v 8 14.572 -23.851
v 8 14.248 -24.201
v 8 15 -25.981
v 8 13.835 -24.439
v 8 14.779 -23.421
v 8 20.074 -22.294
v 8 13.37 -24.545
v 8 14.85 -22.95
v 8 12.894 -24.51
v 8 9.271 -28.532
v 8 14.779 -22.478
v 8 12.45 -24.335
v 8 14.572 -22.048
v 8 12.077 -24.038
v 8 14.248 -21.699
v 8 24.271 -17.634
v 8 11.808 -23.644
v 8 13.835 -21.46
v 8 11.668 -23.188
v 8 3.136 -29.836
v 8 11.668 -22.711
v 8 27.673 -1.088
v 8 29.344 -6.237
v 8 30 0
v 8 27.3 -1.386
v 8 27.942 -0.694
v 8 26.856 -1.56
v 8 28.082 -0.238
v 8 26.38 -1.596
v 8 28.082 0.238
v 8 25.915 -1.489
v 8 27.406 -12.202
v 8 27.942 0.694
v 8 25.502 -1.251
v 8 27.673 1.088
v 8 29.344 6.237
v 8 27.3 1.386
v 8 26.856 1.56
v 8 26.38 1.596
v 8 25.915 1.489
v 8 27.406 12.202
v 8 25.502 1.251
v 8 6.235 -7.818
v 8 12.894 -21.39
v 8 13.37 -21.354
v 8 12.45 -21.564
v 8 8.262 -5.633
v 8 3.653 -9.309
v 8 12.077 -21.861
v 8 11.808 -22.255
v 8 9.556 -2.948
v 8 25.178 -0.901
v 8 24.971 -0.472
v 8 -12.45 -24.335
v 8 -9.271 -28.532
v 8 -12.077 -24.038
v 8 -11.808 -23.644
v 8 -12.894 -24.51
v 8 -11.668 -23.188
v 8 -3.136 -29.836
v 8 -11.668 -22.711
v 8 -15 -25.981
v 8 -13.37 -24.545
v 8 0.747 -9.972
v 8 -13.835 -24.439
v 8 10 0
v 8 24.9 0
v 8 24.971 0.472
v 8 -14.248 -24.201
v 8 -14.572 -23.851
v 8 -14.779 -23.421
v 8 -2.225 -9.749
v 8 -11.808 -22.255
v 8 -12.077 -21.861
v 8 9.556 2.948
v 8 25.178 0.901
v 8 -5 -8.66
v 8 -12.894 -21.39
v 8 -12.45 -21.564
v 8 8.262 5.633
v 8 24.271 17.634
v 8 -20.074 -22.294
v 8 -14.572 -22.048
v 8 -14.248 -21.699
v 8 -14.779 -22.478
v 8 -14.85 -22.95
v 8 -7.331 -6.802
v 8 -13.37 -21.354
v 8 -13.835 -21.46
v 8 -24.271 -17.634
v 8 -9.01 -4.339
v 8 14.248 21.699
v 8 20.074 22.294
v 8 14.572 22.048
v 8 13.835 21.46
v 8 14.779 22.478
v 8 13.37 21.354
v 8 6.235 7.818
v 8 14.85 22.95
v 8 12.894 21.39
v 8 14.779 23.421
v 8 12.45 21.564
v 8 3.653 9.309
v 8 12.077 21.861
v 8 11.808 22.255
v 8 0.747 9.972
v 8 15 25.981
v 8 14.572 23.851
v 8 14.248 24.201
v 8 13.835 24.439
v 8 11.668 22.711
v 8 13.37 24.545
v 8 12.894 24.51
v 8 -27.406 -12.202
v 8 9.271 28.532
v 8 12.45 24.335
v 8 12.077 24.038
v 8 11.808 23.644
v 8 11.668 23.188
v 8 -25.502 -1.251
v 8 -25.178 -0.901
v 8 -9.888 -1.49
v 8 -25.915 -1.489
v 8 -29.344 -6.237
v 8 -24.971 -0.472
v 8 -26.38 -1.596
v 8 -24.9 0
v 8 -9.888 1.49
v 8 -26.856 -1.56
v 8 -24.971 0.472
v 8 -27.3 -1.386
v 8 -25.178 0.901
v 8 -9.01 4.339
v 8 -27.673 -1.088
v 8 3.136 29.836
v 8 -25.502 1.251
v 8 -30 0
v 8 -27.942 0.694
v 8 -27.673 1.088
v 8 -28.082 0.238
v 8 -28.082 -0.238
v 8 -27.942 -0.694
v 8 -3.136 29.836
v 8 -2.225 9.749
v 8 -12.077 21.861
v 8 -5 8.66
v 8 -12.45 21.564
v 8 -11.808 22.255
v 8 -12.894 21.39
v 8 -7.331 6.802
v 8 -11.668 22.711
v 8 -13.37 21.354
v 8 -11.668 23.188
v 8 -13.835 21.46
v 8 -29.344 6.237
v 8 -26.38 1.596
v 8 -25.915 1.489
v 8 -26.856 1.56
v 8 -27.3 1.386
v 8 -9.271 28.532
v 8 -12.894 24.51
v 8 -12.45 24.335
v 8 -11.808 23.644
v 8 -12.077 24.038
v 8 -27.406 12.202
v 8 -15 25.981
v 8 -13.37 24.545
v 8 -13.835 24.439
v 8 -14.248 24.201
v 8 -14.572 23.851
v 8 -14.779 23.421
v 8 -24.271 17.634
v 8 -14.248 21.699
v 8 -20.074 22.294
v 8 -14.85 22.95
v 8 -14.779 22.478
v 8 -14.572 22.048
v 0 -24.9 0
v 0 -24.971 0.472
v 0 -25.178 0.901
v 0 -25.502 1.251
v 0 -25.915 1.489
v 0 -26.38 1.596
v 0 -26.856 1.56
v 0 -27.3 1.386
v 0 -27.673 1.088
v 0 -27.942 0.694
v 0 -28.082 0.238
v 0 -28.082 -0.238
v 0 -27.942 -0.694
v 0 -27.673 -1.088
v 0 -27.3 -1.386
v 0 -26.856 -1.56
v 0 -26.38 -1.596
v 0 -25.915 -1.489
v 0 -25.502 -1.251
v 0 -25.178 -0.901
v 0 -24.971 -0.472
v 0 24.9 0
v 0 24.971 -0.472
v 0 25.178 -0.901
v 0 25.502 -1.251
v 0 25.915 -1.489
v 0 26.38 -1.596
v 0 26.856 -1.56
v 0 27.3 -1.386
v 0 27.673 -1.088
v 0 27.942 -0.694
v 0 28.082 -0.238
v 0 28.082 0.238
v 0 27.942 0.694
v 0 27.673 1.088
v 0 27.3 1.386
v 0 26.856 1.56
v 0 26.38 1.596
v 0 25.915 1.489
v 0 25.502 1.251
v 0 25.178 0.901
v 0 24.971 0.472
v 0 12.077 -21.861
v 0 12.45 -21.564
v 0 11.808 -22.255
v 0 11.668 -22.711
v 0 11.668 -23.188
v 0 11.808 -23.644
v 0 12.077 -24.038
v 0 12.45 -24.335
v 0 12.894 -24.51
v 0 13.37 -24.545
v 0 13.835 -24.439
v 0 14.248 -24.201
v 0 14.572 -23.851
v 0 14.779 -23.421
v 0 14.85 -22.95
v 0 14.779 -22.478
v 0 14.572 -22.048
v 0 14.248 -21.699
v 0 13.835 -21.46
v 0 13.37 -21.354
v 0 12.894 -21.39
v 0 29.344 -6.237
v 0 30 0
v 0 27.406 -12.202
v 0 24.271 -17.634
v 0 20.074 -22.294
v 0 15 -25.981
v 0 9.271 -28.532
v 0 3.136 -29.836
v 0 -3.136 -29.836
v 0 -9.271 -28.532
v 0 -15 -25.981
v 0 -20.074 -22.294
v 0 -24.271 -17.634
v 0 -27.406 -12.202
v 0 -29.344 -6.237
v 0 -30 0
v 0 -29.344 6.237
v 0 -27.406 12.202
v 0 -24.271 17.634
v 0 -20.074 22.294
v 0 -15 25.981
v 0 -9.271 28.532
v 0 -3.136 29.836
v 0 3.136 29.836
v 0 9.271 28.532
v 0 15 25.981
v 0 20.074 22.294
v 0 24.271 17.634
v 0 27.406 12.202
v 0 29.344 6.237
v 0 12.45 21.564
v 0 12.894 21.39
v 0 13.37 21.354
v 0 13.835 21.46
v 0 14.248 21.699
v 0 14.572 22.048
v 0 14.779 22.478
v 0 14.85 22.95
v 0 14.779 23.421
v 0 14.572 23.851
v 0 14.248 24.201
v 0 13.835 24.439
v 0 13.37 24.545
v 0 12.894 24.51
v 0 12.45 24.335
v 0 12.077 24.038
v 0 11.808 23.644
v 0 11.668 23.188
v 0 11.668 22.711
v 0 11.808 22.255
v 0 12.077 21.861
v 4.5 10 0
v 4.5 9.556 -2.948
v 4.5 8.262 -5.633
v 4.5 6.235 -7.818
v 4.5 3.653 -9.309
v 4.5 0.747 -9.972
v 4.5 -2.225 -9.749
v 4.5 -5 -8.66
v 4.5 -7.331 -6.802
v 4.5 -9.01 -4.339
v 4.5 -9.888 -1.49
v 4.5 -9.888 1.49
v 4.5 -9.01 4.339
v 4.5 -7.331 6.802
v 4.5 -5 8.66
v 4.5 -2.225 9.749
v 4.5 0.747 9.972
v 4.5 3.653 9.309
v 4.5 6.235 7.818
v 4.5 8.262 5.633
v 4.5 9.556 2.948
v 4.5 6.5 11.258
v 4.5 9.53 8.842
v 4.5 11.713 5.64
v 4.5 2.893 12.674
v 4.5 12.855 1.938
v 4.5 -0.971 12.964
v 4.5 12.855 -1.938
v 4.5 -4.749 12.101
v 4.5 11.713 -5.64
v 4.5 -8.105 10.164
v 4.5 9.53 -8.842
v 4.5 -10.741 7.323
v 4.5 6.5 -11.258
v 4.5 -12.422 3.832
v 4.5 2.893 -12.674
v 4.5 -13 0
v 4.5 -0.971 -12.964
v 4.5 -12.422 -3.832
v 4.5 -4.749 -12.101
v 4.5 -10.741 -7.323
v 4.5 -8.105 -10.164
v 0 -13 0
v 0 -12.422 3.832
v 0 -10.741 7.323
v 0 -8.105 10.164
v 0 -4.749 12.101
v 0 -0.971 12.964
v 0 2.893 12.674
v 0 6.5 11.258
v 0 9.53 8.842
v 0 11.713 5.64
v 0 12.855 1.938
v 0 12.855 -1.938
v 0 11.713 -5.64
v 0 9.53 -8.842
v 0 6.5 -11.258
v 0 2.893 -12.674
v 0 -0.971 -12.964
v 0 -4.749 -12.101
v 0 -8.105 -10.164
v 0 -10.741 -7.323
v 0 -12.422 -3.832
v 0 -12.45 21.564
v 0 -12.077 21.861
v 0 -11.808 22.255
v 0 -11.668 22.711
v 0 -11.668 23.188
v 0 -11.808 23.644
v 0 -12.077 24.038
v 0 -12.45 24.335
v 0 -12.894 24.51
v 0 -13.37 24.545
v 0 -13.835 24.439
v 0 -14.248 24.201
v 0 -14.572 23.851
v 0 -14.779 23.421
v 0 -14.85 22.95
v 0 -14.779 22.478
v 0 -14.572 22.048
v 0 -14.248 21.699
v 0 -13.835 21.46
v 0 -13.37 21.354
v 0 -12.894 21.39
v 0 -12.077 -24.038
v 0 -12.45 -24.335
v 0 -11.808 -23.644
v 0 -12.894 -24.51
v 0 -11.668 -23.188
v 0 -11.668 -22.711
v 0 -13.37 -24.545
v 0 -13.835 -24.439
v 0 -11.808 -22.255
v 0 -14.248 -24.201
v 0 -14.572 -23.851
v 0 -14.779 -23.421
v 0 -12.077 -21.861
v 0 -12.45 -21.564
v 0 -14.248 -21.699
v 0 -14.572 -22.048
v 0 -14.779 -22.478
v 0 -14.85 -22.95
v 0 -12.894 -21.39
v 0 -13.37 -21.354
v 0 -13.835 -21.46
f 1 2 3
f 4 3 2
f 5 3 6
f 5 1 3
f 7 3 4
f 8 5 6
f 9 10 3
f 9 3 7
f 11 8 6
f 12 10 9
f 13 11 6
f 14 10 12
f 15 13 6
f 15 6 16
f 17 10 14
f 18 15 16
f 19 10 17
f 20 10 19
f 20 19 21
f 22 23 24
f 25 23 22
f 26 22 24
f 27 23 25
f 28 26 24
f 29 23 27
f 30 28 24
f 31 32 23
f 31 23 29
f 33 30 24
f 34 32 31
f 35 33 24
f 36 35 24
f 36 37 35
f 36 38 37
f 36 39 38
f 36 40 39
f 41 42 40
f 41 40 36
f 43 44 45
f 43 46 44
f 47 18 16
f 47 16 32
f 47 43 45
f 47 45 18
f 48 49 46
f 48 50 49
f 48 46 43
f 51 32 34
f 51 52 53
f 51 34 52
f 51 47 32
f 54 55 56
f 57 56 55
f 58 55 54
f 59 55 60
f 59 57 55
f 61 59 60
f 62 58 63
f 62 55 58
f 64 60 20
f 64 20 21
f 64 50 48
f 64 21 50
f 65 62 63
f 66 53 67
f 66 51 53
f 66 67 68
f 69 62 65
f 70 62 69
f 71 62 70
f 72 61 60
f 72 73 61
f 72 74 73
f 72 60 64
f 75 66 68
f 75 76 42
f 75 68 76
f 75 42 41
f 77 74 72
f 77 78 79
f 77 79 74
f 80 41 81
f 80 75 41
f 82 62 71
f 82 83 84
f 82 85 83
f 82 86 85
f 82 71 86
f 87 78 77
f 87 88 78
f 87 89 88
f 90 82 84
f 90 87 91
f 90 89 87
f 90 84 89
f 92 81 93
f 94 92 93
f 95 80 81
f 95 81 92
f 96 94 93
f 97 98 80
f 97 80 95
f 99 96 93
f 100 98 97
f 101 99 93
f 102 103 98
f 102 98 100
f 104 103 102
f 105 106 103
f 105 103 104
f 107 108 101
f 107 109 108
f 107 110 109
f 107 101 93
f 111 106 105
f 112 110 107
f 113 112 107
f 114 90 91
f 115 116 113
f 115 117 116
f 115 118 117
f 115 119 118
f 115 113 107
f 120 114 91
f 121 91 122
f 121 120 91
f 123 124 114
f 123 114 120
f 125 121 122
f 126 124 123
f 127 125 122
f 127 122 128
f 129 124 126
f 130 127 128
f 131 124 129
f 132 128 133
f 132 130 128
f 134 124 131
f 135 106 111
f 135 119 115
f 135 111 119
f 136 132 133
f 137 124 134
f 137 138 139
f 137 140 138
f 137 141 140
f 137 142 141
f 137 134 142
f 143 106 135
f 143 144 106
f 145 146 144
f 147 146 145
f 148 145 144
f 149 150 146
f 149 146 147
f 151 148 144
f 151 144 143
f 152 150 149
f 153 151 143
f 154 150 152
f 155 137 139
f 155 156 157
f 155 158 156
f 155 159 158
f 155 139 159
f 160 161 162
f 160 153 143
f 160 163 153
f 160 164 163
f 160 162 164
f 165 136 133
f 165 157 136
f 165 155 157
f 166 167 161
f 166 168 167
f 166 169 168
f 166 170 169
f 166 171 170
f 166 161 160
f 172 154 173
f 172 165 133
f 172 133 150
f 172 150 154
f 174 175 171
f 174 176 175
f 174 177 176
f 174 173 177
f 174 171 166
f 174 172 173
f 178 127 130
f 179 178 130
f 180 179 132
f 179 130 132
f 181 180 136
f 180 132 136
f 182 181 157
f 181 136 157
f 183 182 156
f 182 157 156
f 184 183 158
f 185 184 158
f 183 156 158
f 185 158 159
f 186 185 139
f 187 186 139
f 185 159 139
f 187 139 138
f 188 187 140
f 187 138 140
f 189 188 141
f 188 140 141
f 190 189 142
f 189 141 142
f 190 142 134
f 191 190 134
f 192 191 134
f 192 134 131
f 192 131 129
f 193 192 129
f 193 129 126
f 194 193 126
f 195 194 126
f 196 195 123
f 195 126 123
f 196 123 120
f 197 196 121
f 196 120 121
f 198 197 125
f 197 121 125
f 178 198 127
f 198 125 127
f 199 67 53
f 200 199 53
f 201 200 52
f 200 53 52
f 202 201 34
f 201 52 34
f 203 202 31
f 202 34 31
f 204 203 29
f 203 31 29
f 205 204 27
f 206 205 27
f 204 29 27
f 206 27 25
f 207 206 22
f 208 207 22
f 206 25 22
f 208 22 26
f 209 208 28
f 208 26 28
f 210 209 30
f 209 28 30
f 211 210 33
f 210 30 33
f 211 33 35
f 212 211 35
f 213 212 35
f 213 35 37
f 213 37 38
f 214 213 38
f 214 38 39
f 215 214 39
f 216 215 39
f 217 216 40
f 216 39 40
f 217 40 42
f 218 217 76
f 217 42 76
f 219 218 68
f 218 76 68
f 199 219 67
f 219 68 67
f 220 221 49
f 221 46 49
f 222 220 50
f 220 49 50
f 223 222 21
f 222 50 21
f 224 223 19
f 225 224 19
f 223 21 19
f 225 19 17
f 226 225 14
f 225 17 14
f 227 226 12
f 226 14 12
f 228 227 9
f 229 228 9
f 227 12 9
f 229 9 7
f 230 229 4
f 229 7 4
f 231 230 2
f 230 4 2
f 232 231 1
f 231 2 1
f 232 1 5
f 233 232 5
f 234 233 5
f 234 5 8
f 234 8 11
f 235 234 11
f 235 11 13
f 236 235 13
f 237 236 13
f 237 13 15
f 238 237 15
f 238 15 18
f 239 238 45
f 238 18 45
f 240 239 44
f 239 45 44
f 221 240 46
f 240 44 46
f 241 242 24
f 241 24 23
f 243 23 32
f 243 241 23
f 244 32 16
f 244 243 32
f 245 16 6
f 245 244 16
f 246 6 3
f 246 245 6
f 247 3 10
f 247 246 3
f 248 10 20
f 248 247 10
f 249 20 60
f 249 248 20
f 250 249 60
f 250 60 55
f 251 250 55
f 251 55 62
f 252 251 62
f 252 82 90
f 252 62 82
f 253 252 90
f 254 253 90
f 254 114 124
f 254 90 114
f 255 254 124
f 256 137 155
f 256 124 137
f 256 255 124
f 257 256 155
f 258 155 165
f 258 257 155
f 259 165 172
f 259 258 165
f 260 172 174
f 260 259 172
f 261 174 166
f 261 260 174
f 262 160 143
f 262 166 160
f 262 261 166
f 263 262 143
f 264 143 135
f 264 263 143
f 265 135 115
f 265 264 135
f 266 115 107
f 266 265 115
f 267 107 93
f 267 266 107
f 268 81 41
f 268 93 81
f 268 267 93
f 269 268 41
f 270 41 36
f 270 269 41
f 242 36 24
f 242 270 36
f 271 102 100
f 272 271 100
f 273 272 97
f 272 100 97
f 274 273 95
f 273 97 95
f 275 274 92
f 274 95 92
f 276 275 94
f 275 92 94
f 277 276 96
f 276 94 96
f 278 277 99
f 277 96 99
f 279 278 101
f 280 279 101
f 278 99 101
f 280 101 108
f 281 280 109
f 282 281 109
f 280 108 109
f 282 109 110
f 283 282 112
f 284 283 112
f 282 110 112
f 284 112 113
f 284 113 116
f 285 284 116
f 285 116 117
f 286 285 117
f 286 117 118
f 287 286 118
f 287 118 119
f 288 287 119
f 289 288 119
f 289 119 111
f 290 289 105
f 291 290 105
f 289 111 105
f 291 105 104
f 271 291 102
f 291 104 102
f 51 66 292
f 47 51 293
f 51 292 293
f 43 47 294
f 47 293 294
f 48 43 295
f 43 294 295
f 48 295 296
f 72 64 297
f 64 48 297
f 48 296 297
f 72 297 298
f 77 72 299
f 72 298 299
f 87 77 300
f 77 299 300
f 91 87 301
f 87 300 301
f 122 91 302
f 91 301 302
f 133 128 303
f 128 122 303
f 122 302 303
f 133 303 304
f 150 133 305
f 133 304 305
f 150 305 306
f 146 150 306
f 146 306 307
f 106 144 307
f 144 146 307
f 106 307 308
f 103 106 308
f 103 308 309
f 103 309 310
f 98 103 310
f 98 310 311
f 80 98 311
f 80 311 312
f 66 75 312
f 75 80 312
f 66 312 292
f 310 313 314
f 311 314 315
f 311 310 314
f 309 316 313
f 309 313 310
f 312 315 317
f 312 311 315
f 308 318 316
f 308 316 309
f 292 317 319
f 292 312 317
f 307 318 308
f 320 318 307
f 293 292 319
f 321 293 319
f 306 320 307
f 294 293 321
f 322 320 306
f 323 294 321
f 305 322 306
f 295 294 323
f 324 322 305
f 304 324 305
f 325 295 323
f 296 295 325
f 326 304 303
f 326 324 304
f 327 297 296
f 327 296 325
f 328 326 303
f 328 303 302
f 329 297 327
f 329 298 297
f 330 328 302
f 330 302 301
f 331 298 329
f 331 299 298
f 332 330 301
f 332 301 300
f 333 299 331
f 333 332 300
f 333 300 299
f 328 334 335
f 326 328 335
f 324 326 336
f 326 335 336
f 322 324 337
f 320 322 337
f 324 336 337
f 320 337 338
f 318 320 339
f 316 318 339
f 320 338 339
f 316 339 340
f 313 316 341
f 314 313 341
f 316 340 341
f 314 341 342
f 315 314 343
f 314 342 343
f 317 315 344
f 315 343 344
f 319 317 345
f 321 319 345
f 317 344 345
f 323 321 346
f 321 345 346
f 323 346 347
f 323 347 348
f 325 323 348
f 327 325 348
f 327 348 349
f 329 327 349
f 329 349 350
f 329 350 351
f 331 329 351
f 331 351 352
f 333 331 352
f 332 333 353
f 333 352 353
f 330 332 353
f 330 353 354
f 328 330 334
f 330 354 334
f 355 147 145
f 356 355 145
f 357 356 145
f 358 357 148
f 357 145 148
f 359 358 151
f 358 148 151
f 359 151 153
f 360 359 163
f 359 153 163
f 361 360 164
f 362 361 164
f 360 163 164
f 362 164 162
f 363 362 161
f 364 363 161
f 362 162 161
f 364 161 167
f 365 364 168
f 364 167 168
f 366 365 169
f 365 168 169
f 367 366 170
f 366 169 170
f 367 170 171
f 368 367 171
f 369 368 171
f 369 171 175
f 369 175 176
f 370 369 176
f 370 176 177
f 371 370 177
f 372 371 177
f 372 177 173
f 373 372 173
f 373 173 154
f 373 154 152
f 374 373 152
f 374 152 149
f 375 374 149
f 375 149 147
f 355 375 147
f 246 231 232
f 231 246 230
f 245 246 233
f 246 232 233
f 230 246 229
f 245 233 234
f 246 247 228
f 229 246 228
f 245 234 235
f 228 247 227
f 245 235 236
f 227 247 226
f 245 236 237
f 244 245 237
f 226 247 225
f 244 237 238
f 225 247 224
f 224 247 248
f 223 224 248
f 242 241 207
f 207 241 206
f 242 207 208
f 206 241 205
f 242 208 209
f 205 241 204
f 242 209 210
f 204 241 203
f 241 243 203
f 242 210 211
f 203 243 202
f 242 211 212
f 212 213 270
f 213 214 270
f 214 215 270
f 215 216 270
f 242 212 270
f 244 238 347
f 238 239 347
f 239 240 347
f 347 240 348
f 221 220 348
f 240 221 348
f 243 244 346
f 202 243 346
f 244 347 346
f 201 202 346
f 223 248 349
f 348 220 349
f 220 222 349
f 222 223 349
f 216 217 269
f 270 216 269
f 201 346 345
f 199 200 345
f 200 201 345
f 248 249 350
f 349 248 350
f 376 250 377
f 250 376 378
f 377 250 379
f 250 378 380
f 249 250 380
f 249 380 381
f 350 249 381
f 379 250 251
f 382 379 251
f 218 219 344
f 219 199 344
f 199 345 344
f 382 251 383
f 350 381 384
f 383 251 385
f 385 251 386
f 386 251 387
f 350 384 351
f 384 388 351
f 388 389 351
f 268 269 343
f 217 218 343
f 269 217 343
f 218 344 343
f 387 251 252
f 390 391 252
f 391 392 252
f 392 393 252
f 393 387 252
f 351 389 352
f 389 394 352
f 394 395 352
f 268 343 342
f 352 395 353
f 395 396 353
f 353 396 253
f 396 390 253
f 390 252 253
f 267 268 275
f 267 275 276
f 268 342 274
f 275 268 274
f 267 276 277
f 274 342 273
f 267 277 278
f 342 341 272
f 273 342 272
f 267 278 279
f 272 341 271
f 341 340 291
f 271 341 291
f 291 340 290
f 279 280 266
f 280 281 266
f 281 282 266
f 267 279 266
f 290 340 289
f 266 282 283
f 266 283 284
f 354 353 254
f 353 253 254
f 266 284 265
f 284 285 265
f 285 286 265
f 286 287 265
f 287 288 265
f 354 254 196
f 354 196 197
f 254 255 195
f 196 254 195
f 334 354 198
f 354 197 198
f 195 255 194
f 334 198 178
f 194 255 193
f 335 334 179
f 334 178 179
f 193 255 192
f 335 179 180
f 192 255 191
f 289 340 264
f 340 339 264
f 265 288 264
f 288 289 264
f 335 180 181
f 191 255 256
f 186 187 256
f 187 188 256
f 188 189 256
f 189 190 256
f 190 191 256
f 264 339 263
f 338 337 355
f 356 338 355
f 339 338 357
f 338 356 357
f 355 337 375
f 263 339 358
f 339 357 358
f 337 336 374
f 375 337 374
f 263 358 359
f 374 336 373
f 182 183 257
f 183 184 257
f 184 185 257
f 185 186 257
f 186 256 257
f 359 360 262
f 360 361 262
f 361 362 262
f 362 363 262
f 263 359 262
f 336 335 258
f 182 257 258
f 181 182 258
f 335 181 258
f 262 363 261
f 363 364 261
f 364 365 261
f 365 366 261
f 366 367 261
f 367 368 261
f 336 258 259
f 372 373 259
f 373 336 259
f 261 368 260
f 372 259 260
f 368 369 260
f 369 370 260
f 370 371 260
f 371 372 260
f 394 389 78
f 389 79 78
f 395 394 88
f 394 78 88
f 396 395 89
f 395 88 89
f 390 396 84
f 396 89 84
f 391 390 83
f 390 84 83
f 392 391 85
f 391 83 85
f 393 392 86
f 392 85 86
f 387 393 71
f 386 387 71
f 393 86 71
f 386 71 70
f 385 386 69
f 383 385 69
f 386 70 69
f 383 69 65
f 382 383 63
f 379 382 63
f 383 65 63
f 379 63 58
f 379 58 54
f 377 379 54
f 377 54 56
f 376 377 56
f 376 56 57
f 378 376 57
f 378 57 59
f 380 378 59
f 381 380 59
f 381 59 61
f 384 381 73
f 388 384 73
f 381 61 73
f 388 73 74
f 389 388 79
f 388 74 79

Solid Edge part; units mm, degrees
sketch "Sketch1" plane through (0, 0, 0) normal (1, 0, 0) x (0, 1, 0)
  circle A0 centre (0, 0) radius 10
  circle A1 centre (0, 0) radius 30
extrude "Protrusion1" add sketch "Sketch1" along normal blind 8
sketch "Sketch2" plane through (0, 0, 0) normal (-1, 0, 0) x (0, -1, 0)
  circle A0 centre (0, 0) radius 13
extrude "ExtrudedCutout_1" cut sketch "Sketch2" against normal blind 4.5
sketch "Sketch3" plane through (8, 0, 0) normal (1, 0, 0) x (0, 1, 0)
  circle A0 centre (-26.5, 0) radius 1.6
  dimension "D1" = 26.5
extrude "Cutout1" cut sketch "Sketch3" against normal up to next
pattern_circular "Pattern1" count 6 over 360 about axis through (8, 0, 0) along (-1, 0, 0) of "Cutout1"
